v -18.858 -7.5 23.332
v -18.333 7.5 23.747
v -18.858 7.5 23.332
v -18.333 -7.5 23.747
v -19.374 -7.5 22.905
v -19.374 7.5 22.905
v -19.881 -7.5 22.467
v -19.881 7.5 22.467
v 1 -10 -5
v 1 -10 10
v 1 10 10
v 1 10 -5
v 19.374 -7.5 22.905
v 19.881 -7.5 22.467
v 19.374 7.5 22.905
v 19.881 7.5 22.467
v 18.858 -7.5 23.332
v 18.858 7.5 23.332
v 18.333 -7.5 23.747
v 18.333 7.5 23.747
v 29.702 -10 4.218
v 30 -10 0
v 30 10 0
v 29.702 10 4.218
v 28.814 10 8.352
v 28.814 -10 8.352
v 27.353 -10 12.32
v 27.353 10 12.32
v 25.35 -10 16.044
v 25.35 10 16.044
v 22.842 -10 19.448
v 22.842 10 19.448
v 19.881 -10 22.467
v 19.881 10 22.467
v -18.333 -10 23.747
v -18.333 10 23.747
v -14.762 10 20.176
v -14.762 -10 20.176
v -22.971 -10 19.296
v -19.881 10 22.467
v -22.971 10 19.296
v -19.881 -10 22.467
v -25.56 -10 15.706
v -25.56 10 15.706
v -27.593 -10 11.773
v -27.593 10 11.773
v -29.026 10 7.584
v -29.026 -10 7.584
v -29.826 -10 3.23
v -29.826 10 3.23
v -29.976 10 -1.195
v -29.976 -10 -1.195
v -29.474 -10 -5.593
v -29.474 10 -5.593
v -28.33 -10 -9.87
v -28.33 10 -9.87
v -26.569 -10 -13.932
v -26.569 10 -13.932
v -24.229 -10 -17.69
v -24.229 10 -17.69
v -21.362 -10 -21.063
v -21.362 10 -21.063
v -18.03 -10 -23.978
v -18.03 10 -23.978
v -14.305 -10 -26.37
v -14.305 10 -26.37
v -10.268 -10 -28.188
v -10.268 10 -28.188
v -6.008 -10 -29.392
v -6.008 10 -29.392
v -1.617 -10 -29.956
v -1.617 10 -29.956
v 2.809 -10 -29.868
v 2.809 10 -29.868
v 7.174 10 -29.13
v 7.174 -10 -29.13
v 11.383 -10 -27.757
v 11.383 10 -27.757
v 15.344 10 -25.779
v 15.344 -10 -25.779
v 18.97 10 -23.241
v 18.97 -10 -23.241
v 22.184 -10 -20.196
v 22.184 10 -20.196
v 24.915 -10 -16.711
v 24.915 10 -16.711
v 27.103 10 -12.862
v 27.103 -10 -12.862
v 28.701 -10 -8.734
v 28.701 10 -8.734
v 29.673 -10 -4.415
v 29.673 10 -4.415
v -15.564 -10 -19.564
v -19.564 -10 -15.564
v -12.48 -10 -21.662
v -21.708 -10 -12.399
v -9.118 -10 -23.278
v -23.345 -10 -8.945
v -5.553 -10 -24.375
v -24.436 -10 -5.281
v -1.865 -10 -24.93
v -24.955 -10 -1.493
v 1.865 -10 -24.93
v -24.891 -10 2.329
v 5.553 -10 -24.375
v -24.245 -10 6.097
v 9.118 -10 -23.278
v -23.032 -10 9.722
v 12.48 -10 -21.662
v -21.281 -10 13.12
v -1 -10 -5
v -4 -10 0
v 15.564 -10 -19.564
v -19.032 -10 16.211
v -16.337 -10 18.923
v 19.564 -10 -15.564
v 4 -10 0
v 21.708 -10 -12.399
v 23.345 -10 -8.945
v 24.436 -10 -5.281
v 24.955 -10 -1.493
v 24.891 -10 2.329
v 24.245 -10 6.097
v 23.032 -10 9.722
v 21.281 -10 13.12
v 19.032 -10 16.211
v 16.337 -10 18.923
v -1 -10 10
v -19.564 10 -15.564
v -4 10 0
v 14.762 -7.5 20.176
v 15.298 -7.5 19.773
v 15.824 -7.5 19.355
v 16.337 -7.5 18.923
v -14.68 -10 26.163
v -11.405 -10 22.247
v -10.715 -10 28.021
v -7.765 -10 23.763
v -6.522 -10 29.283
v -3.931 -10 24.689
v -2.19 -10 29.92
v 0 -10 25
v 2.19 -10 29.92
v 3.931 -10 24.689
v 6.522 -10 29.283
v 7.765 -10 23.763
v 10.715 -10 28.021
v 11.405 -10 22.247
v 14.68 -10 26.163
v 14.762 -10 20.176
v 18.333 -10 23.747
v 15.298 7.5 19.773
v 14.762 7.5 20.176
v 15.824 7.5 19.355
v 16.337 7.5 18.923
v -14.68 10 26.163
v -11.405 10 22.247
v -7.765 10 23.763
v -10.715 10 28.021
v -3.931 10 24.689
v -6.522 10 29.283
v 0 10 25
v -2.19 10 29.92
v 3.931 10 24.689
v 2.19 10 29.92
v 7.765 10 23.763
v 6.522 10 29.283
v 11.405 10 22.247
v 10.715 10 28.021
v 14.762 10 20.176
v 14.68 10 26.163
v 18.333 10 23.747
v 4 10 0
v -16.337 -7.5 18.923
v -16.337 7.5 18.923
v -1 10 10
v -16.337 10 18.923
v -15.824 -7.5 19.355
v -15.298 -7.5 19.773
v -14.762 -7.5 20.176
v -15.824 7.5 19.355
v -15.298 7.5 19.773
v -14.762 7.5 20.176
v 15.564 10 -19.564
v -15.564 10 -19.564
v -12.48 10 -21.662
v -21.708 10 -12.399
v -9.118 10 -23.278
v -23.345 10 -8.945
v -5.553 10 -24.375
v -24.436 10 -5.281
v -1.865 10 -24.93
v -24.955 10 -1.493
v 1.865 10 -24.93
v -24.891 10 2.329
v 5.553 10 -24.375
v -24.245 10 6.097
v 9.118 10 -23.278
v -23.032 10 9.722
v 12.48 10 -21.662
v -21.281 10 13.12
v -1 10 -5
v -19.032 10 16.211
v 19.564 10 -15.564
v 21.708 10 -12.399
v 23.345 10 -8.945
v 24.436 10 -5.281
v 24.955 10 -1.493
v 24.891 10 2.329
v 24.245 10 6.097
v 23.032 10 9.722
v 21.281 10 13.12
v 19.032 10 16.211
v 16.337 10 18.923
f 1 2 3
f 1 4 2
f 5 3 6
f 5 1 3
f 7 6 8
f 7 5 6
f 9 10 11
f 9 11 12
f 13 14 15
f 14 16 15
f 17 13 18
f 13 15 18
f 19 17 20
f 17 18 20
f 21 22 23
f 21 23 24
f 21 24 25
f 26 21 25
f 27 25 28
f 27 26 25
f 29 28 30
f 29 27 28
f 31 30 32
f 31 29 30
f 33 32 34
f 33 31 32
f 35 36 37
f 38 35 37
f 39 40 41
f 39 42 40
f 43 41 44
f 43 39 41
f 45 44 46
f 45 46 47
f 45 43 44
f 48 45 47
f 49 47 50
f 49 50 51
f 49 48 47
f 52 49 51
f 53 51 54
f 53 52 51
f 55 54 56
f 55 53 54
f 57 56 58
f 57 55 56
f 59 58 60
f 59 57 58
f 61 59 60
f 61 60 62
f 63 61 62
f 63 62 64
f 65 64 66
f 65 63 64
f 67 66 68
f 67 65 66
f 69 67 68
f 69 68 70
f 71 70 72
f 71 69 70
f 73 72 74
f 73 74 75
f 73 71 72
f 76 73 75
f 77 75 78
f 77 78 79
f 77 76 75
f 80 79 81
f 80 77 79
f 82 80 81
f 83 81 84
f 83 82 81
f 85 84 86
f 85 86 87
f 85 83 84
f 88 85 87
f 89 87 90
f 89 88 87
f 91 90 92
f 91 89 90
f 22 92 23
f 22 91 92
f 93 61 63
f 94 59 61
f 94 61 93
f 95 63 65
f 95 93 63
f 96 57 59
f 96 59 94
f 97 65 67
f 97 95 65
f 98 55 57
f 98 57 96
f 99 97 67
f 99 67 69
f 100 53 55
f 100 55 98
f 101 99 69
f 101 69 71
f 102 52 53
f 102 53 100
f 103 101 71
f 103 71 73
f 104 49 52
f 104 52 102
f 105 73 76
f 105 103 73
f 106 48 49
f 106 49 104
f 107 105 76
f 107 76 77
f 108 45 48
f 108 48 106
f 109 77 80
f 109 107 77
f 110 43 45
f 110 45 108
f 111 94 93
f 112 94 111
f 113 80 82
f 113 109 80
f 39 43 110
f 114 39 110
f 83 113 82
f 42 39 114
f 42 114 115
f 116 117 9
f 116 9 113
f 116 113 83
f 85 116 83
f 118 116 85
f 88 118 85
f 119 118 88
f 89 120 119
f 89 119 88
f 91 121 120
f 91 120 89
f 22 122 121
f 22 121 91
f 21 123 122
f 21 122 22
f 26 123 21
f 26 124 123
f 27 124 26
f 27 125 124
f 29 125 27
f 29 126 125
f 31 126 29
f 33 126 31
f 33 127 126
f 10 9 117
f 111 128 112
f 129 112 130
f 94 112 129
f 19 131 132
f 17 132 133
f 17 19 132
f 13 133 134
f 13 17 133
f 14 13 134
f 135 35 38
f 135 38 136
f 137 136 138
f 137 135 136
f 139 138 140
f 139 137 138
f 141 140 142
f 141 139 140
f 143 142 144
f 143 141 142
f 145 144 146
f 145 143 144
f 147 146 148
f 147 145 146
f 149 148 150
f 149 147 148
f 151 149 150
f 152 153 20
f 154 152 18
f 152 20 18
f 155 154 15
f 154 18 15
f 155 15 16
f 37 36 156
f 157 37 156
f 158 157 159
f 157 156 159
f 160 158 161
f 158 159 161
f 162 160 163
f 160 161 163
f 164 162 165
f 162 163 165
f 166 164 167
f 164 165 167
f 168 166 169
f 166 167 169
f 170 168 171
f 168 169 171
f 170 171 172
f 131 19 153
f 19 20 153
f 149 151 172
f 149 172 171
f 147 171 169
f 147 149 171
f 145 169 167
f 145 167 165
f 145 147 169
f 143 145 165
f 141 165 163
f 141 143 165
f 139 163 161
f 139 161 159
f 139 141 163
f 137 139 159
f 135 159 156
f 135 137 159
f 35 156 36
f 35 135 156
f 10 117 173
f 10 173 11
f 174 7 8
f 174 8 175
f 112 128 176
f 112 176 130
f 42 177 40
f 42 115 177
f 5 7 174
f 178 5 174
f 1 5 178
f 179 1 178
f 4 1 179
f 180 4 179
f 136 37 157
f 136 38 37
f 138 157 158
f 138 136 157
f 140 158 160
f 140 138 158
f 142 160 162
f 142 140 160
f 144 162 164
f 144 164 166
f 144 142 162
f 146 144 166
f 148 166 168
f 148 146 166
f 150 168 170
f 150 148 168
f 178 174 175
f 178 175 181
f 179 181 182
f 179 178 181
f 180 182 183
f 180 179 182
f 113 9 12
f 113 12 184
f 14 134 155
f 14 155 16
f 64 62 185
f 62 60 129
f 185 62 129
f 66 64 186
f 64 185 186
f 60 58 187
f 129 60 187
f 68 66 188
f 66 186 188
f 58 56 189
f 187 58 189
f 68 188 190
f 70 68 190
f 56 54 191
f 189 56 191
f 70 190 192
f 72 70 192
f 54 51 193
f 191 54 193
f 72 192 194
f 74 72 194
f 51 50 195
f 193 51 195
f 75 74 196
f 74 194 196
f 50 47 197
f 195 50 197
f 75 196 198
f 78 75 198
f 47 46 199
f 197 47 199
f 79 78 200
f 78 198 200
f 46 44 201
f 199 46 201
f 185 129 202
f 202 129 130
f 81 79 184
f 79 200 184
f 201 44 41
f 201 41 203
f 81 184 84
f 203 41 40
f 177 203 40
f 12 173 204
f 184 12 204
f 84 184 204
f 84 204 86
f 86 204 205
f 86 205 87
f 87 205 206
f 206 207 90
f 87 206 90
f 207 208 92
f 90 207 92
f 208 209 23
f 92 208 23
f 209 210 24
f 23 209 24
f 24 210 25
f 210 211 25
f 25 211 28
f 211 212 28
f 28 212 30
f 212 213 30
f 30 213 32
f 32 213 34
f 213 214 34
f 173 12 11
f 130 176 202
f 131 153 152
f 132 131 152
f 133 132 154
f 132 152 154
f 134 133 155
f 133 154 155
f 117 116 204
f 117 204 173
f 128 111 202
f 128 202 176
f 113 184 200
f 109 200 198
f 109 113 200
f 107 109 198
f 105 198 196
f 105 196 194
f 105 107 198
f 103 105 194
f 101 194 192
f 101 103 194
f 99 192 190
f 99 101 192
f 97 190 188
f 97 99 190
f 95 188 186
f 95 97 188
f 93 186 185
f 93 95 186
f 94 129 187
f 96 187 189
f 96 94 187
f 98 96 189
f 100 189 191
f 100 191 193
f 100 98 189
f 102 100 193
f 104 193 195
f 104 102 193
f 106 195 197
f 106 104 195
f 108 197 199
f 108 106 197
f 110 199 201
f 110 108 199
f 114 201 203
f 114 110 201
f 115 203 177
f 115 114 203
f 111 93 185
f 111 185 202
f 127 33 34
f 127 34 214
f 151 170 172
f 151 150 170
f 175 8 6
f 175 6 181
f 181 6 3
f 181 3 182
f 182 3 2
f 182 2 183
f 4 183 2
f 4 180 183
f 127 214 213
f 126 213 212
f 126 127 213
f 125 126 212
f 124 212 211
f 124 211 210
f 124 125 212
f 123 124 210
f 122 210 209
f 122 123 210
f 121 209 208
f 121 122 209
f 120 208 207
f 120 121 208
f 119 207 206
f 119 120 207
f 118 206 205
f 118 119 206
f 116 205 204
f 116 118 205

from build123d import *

# Parameters (mm, degrees)
F1_DEPTH = 10
F2_DEPTH = 10
F3_DEPTH = 7.5


with BuildPart() as f1:
    # F0 (on Front) → F1 (new body, symmetric)
    with BuildSketch(Plane.XZ):
        with BuildLine():
            ThreePointArc((-19.880874, 22.466661), (-12.320182, -27.353484), (30, 0))
            ThreePointArc((30, 0), (27.353484, 12.320182), (19.880874, 22.466661))
            Line((19.880874, 22.466661), (16.337434, 18.92322))
            ThreePointArc((16.337434, 18.92322), (24.891288, 2.328897), (19.564168, -15.564168))
            Line((19.564168, -15.564168), (4, 0))
            Line((4, 0), (1, 10))
            Line((1, 10), (1, -5))
            Line((1, -5), (15.564168, -19.564168))
            ThreePointArc((15.564168, -19.564168), (0, -25), (-15.564168, -19.564168))
            Line((-15.564168, -19.564168), (-1, -5))
            Line((-1, -5), (-1, 10))
            Line((-1, 10), (-4, 0))
            Line((-4, 0), (-19.564168, -15.564168))
            ThreePointArc((-19.564168, -15.564168), (-24.891288, 2.328897), (-16.337434, 18.92322))
            Line((-16.337434, 18.92322), (-19.880874, 22.466661))
        make_face()
    extrude(amount=F1_DEPTH, both=True)


with BuildPart() as f2:
    # F0 (on Front) → F2 (new body, symmetric)
    with BuildSketch(Plane.XZ):
        with BuildLine():
            Line((14.762054, 20.176267), (18.332655, 23.746868))
            ThreePointArc((18.332655, 23.746868), (0, 30), (-18.332655, 23.746868))
            Line((-18.332655, 23.746868), (-14.762054, 20.176267))
            ThreePointArc((-14.762054, 20.176267), (0, 25), (14.762054, 20.176267))
        make_face()
    extrude(amount=F2_DEPTH, both=True)


with BuildPart() as f3:
    # F0 (on Front) → F3 (new body, symmetric)
    with BuildSketch(Plane.XZ):
        with BuildLine():
            Line((16.337434, 18.92322), (19.880874, 22.466661))
            ThreePointArc((19.880874, 22.466661), (19.117484, 23.119728), (18.332655, 23.746868))
            Line((18.332655, 23.746868), (14.762054, 20.176267))
            ThreePointArc((14.762054, 20.176267), (15.56236, 19.565606), (16.337434, 18.92322))
        make_face()
        with BuildLine():
            ThreePointArc((-18.332655, 23.746868), (-19.117484, 23.119728), (-19.880874, 22.466661))
            Line((-19.880874, 22.466661), (-16.337434, 18.92322))
            ThreePointArc((-16.337434, 18.92322), (-15.56236, 19.565606), (-14.762054, 20.176267))
            Line((-14.762054, 20.176267), (-18.332655, 23.746868))
        make_face()
    extrude(amount=F3_DEPTH, both=True)


solid = Compound([f1.part, f2.part, f3.part])
